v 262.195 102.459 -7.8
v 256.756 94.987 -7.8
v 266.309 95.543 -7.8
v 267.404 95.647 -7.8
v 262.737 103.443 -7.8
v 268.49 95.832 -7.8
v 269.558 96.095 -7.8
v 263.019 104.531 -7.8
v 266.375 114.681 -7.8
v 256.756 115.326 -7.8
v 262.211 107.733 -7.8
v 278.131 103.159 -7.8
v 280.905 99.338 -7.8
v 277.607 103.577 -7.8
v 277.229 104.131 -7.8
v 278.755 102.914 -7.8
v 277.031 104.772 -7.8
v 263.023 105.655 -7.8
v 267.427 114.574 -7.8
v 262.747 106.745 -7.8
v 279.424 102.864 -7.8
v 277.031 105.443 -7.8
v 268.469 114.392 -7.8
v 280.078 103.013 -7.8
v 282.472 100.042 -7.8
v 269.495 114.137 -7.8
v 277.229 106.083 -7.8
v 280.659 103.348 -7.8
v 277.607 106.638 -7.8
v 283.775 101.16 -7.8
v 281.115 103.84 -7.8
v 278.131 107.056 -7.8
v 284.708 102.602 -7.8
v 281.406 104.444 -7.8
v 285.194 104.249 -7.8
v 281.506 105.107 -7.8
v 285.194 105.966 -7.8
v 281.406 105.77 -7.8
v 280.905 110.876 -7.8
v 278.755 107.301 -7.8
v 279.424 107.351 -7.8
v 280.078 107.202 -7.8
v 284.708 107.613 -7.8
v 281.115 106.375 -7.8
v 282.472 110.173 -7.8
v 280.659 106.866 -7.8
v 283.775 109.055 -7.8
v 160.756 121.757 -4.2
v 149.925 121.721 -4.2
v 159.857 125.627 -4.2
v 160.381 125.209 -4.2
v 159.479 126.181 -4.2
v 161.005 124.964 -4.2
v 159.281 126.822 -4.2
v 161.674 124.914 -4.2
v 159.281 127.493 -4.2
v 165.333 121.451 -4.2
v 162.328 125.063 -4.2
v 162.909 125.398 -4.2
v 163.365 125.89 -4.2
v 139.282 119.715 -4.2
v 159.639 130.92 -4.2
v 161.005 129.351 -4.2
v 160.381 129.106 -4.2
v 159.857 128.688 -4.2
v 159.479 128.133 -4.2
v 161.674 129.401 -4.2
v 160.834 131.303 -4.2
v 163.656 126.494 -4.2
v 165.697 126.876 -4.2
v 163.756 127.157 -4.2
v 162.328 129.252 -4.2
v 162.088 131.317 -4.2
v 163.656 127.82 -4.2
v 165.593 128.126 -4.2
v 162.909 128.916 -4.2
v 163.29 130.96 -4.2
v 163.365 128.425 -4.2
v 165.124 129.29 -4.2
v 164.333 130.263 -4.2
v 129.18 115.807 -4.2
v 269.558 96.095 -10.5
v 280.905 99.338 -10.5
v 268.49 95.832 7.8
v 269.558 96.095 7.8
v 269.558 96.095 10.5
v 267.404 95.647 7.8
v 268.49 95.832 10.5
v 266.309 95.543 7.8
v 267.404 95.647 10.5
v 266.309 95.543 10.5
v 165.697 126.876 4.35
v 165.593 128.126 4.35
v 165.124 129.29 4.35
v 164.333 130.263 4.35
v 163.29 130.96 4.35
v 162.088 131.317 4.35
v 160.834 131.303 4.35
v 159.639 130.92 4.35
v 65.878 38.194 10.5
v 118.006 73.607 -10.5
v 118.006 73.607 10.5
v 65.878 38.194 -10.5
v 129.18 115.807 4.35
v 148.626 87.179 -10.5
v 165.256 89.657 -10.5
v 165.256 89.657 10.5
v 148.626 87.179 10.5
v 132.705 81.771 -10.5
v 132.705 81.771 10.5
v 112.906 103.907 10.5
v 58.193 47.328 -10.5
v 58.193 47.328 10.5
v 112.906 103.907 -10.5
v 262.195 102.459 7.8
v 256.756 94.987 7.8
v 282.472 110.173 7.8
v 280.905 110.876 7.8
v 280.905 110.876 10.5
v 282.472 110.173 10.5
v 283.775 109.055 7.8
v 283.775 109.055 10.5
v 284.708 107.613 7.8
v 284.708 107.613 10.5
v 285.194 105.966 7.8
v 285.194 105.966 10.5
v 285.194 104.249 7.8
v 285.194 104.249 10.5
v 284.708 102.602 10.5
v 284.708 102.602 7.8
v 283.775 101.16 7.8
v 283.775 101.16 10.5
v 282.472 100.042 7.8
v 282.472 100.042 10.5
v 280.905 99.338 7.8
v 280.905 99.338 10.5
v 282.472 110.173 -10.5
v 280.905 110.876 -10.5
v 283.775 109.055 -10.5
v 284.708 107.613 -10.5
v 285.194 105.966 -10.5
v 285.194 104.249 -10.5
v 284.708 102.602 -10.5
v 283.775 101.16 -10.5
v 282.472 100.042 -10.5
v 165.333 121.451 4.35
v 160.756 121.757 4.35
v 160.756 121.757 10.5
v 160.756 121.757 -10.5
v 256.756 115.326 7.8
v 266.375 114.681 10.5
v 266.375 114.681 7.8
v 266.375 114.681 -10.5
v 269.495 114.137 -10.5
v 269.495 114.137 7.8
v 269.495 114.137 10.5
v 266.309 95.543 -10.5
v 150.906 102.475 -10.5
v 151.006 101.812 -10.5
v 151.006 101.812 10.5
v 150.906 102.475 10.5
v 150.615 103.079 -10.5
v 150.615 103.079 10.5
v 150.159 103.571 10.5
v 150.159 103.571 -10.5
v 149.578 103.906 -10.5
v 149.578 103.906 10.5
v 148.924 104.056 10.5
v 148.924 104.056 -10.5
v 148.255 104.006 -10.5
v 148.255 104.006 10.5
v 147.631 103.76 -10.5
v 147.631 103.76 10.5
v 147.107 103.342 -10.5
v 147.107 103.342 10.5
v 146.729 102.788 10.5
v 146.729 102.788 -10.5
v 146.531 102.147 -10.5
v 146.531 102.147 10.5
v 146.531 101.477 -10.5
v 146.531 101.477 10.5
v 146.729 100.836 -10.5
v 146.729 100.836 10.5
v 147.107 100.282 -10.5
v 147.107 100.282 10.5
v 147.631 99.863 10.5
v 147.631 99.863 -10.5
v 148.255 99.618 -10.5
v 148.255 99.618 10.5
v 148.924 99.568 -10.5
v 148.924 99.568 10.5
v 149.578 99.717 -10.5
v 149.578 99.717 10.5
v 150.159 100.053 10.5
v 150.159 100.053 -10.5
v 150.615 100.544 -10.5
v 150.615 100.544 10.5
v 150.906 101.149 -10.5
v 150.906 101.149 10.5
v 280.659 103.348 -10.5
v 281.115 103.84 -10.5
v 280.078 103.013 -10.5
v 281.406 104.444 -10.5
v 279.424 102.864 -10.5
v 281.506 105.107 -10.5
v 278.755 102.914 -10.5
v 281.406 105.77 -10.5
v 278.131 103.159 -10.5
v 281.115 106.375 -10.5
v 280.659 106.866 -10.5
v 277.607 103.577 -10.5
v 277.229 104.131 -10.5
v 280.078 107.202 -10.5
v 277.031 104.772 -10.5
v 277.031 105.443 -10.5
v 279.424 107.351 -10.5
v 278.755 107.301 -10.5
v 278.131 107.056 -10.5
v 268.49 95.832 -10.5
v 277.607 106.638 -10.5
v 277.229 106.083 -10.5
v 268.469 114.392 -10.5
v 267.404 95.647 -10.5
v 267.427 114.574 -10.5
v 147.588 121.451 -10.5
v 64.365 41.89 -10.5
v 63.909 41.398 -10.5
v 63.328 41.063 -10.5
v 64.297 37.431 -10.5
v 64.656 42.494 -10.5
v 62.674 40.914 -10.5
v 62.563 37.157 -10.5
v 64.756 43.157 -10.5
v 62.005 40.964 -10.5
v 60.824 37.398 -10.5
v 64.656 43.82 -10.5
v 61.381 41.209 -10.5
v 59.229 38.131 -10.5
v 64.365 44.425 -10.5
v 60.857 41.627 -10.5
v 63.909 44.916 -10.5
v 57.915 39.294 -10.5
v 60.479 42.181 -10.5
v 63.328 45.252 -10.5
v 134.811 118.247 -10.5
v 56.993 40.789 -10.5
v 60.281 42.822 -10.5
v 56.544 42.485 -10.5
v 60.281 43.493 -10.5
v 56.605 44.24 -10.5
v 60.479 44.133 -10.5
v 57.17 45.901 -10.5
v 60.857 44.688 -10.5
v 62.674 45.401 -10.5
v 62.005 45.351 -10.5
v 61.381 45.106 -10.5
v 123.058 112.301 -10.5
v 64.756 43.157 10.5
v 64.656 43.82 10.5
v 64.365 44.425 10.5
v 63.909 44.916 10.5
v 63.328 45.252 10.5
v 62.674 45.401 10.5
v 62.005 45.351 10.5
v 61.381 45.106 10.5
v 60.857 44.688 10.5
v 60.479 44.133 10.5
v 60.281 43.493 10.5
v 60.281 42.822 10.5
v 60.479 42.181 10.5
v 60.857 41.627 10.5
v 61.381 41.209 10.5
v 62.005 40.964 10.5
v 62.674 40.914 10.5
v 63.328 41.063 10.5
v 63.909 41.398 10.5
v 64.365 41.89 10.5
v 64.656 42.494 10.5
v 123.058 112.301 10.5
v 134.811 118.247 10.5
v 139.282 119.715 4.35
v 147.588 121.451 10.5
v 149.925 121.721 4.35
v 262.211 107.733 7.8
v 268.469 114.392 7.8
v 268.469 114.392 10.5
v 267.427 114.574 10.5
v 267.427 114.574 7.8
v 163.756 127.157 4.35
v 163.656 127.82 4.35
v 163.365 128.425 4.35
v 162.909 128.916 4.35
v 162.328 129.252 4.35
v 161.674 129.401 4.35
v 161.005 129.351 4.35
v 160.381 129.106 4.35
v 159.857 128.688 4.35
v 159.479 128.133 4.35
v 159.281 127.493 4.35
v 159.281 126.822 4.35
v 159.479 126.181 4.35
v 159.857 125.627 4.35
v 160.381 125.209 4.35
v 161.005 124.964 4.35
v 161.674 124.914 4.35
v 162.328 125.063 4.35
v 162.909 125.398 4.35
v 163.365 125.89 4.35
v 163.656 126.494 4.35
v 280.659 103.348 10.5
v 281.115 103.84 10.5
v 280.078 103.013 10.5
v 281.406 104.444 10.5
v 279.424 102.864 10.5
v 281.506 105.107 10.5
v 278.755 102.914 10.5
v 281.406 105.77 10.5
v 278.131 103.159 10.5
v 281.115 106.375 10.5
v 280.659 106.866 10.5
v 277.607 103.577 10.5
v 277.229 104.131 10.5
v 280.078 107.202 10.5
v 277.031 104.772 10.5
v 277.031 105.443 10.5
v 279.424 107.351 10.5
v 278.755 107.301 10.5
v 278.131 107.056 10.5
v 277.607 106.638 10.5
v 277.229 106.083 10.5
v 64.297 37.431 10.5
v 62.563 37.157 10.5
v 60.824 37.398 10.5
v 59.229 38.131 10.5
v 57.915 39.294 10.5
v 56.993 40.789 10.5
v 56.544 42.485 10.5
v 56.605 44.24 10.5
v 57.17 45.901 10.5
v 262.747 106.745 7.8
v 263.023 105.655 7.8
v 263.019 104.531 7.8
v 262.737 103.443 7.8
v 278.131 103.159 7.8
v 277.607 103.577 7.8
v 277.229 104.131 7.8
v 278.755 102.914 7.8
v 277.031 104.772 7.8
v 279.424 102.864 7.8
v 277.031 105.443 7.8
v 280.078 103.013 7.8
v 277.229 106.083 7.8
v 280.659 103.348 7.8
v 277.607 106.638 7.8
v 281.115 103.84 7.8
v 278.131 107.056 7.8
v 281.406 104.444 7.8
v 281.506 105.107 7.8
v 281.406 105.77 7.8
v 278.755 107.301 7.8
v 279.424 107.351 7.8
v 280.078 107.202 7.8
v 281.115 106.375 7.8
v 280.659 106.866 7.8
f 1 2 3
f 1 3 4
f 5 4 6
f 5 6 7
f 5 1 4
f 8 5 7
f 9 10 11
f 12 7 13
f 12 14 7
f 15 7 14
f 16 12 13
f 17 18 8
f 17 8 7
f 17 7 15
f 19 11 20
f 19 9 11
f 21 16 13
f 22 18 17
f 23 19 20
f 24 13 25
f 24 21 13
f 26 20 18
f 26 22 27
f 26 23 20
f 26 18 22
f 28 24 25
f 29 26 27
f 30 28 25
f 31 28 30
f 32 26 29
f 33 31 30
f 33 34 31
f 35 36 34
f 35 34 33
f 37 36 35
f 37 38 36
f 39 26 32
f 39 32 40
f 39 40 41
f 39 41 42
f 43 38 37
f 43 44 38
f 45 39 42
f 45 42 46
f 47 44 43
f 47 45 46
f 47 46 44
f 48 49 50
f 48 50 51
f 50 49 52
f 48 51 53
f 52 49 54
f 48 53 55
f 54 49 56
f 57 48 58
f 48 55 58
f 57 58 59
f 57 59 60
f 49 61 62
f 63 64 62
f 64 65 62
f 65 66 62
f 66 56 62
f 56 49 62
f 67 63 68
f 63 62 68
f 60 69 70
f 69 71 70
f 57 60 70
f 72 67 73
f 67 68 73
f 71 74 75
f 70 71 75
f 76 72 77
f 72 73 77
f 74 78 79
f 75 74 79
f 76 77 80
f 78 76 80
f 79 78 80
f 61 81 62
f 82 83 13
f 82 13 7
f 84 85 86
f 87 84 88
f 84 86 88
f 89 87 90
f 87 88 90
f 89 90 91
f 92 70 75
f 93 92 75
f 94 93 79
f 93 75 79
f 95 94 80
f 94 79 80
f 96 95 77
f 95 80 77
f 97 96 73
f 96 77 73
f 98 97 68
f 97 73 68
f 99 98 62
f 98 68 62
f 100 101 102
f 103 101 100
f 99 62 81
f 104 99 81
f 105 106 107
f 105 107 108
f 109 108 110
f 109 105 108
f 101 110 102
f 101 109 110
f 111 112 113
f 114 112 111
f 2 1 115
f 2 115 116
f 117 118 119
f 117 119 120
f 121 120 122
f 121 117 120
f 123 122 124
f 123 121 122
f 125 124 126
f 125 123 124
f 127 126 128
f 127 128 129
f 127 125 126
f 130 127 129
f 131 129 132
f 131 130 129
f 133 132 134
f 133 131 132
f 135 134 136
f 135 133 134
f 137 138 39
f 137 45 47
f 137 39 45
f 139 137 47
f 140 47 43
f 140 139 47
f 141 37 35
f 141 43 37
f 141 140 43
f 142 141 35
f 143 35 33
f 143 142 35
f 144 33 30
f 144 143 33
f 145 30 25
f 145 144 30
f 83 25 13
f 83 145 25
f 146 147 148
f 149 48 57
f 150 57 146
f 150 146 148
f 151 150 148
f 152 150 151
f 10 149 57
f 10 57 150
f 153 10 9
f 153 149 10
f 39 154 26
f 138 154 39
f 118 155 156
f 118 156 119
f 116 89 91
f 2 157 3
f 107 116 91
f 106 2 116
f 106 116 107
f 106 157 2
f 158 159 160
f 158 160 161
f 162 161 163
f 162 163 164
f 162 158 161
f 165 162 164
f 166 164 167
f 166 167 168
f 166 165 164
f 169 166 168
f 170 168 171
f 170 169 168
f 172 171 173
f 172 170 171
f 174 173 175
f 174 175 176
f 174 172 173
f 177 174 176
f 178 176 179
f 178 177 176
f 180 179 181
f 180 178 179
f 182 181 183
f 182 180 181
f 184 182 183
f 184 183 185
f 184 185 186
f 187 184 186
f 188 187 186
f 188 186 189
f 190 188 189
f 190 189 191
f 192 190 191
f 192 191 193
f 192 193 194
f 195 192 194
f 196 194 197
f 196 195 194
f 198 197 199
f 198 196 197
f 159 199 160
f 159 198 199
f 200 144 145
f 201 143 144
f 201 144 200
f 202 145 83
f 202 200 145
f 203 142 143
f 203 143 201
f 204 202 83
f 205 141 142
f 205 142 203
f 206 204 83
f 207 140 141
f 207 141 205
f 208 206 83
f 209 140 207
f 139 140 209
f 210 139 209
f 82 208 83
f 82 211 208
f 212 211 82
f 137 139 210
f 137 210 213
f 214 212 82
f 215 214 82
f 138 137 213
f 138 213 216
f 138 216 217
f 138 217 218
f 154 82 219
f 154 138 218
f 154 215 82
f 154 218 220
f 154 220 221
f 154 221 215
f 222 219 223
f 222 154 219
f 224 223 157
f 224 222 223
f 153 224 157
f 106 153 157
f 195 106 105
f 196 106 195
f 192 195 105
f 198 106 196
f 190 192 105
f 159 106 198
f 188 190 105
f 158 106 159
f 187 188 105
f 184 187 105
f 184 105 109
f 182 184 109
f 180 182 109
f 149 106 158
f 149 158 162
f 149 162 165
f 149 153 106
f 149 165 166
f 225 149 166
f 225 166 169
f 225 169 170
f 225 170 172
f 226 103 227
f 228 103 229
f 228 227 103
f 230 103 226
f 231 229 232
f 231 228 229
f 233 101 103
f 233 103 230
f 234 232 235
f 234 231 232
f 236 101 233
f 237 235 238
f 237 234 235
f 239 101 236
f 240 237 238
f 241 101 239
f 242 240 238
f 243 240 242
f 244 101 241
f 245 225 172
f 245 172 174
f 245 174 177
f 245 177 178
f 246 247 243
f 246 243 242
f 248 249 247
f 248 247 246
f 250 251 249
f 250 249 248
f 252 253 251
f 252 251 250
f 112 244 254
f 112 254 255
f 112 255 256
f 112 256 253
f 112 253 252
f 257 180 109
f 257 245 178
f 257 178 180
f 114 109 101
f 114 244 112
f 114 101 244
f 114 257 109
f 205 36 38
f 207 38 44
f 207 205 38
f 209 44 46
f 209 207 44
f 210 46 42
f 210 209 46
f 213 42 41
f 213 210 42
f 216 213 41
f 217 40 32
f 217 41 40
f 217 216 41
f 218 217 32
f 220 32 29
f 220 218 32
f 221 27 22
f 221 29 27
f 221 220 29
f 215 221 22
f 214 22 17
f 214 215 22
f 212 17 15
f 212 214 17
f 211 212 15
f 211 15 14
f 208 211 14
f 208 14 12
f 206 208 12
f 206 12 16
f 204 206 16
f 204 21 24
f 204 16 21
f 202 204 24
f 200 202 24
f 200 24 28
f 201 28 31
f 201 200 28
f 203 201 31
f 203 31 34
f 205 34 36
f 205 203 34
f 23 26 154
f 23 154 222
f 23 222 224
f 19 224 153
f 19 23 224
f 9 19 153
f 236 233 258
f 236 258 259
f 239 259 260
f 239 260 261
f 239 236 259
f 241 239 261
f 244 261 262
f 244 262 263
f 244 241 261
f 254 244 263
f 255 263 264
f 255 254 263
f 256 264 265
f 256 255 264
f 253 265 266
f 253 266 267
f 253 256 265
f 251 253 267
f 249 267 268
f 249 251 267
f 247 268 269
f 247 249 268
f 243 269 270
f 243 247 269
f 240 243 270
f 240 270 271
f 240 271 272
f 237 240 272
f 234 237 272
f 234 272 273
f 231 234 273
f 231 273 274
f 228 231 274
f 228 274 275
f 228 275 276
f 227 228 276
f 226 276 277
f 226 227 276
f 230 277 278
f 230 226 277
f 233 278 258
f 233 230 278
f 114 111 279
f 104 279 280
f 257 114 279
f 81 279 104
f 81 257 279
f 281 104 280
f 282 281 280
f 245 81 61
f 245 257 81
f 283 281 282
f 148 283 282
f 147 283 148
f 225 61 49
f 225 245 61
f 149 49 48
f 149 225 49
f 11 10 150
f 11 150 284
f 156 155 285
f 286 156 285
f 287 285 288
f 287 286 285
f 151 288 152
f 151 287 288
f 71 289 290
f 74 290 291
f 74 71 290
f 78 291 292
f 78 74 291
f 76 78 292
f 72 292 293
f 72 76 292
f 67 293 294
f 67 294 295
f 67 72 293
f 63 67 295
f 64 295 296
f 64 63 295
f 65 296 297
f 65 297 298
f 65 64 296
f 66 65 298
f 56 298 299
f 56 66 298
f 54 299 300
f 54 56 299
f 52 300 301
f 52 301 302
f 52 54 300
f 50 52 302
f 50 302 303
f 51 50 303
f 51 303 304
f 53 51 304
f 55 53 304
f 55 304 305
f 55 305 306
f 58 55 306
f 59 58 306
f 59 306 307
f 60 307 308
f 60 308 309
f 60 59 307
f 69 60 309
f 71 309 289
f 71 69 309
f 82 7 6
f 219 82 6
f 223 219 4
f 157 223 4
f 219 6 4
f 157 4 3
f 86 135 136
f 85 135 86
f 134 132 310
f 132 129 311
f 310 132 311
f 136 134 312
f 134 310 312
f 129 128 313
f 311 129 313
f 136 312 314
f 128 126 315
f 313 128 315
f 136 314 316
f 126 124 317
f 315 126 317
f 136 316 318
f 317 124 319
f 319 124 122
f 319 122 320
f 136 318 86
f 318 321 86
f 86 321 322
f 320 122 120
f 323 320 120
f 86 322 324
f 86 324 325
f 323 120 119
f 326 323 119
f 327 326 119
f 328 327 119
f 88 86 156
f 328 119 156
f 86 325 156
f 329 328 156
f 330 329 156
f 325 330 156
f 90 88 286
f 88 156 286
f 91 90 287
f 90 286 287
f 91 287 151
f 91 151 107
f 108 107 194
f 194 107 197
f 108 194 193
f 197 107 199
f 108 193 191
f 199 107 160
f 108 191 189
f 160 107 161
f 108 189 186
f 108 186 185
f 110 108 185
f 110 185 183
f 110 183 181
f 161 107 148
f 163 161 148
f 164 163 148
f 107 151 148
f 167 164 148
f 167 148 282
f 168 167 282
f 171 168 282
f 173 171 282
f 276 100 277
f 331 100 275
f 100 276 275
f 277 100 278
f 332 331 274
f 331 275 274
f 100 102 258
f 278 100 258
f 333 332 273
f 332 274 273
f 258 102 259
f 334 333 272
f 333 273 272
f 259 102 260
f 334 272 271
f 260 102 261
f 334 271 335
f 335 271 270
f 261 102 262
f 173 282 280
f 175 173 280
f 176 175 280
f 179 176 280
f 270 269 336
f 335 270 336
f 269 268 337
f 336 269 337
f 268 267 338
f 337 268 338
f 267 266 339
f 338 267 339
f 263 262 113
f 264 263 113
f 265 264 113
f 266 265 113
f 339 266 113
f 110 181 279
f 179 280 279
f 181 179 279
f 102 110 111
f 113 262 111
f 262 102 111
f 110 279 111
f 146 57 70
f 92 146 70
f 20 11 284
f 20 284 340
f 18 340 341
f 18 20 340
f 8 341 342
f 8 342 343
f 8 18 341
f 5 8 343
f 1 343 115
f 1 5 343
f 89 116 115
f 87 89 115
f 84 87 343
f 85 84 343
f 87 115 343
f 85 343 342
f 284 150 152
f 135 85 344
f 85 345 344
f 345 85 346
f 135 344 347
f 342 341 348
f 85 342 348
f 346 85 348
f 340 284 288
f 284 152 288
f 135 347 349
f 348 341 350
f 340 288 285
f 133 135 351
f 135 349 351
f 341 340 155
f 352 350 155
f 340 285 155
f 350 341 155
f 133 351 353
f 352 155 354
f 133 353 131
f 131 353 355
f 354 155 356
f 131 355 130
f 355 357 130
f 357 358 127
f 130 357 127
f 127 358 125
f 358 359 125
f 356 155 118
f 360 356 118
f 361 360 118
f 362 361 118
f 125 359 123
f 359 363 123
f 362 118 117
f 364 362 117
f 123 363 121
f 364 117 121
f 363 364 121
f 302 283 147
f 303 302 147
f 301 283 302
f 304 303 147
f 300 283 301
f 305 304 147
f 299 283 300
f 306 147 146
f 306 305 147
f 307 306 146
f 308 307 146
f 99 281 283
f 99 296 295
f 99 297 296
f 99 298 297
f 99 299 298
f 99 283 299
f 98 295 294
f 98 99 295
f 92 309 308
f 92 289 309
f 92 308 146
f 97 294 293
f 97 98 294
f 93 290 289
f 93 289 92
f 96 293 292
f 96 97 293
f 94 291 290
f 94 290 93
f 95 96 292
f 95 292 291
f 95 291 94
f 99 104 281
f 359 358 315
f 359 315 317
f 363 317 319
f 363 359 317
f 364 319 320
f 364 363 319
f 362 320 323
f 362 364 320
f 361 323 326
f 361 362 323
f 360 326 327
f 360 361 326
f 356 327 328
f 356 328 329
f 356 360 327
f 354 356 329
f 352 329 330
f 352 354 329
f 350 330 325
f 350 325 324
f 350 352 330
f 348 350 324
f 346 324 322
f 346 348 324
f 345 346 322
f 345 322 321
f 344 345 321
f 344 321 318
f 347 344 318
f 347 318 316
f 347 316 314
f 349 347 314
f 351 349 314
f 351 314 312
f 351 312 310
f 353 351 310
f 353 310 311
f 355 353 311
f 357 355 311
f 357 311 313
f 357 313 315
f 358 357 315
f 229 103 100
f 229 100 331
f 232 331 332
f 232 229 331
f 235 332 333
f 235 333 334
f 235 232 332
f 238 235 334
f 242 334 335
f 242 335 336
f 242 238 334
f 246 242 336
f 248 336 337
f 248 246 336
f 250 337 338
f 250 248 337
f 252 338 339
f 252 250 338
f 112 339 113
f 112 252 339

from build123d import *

# Parameters (mm, degrees)
EXTRUDE_1_DEPTH          = 7
EXTRUDE_1_DEPTH_BACK     = 7
SKETCH_1_R               = 1.5
FILLET_1_R               = 10
EXTRUDE_2_DEPTH          = 2.9
EXTRUDE_2_DEPTH_BACK     = 2.8
SKETCH_3_R               = 1.5
CUT_EXTRUDE_1_DEPTH      = 5.2
CUT_EXTRUDE_1_DEPTH_BACK = 5.2
SCALE1_SCALE             = 1.5


with BuildPart() as part:
    # 草图1 → 凸台-拉伸1 (new, two sides: drawn at the far end of the back side and taken through both)
    with BuildSketch(Plane.XY.offset(-EXTRUDE_1_DEPTH_BACK)):
        with BuildLine():
            ThreePointArc((132.1, 80.8), (147.125308547, 88.283437456), (163.6, 91.5))
            Line((163.6, 91.5), (232.071936087, 95.488208898))
            Line((232.071936087, 95.488208898), (240.699236038, 97.954004663))
            ThreePointArc((240.699236038, 97.954004663), (243.6, 101.8), (240.699236038, 105.645995337))
            Line((240.699236038, 105.645995337), (232.071936087, 108.111791102))
            Line((232.071936087, 108.111791102), (160.6, 112.9))
            ThreePointArc((160.6, 112.9), (143.303490983, 110.55954938), (128.7, 101))
            Line((128.7, 101), (92.224555949, 63.280615311))
            ThreePointArc((92.224555949, 63.280615311), (92.03920173, 57.924827394), (97.347754748, 57.19128445))
            Line((97.347754748, 57.19128445), (132.1, 80.8))
        make_face()
        with Locations((95.1, 60.5)):
            Circle(SKETCH_1_R, mode=Mode.SUBTRACT)
        with Locations((152.6, 99.603139307)):
            Circle(SKETCH_1_R, mode=Mode.SUBTRACT)
        with Locations((239.6, 101.8)):
            Circle(SKETCH_1_R, mode=Mode.SUBTRACT)
    extrude(amount=EXTRUDE_1_DEPTH + EXTRUDE_1_DEPTH_BACK)

    # 圆角1
    fillet_1_edges = [part.edges().sort_by_distance(p)[0] for p in [
        (232.071936087, 95.488208898, 0),
        (232.071936087, 108.111791102, 0),
    ]]
    fillet(fillet_1_edges, radius=FILLET_1_R)

    # 草图3 → 凸台-拉伸2 (add, two sides: drawn at the far end of the back side and taken through both)
    with BuildSketch(Plane.XY.offset(-EXTRUDE_2_DEPTH_BACK)):
        with BuildLine():
            Line((160.6, 112.9), (163.651401787, 112.69557362))
            Line((163.651401787, 112.69557362), (163.893737551, 116.312835642))
            ThreePointArc((163.893737551, 116.312835642), (162.654460758, 118.828873494), (159.855517856, 119.008239262))
            Line((159.855517856, 119.008239262), (139.549521827, 108.933263618))
            ThreePointArc((139.549521827, 108.933263618), (149.801009446, 112.369362402), (160.6, 112.9))
        make_face()
        with Locations((161.1, 116.5)):
            Circle(SKETCH_3_R, mode=Mode.SUBTRACT)
    extrude(amount=EXTRUDE_2_DEPTH + EXTRUDE_2_DEPTH_BACK)

    # 草图4 → 切除-拉伸1 (cut, two sides: drawn at the far end of the back side and taken through both)
    with BuildSketch(Plane.XY.offset(-CUT_EXTRUDE_1_DEPTH_BACK)):
        with BuildLine():
            Line((231.012866709, 108.182742662), (224.6, 108.612367871))
            Line((224.6, 108.612367871), (228.236474469, 103.550312019))
            ThreePointArc((228.236474469, 103.550312019), (228.799985675, 101.790729145), (228.225610058, 100.034662683))
            Line((228.225610058, 100.034662683), (224.6, 95.052999327))
            Line((224.6, 95.052999327), (230.968280992, 95.423925524))
            ThreePointArc((230.968280992, 95.423925524), (232.061731819, 95.548272011), (233.134897693, 95.792017302))
            Line((233.134897693, 95.792017302), (240.699236038, 97.954004663))
            ThreePointArc((240.699236038, 97.954004663), (243.6, 101.8), (240.699236038, 105.645995337))
            Line((240.699236038, 105.645995337), (233.092512669, 107.820096895))
            ThreePointArc((233.092512669, 107.820096895), (232.062285935, 108.056450871), (231.012866709, 108.182742662))
        make_face()
    extrude(amount=CUT_EXTRUDE_1_DEPTH + CUT_EXTRUDE_1_DEPTH_BACK, mode=Mode.SUBTRACT)


with BuildPart() as part_1:
    # Scale1: scaled about (160.287784575, 95.185568028, 0.00047642)
    add(part.part.scale(SCALE1_SCALE).moved(Location((-80.143892287, -47.592784014, -0.00023821))))


solid = part_1.part
